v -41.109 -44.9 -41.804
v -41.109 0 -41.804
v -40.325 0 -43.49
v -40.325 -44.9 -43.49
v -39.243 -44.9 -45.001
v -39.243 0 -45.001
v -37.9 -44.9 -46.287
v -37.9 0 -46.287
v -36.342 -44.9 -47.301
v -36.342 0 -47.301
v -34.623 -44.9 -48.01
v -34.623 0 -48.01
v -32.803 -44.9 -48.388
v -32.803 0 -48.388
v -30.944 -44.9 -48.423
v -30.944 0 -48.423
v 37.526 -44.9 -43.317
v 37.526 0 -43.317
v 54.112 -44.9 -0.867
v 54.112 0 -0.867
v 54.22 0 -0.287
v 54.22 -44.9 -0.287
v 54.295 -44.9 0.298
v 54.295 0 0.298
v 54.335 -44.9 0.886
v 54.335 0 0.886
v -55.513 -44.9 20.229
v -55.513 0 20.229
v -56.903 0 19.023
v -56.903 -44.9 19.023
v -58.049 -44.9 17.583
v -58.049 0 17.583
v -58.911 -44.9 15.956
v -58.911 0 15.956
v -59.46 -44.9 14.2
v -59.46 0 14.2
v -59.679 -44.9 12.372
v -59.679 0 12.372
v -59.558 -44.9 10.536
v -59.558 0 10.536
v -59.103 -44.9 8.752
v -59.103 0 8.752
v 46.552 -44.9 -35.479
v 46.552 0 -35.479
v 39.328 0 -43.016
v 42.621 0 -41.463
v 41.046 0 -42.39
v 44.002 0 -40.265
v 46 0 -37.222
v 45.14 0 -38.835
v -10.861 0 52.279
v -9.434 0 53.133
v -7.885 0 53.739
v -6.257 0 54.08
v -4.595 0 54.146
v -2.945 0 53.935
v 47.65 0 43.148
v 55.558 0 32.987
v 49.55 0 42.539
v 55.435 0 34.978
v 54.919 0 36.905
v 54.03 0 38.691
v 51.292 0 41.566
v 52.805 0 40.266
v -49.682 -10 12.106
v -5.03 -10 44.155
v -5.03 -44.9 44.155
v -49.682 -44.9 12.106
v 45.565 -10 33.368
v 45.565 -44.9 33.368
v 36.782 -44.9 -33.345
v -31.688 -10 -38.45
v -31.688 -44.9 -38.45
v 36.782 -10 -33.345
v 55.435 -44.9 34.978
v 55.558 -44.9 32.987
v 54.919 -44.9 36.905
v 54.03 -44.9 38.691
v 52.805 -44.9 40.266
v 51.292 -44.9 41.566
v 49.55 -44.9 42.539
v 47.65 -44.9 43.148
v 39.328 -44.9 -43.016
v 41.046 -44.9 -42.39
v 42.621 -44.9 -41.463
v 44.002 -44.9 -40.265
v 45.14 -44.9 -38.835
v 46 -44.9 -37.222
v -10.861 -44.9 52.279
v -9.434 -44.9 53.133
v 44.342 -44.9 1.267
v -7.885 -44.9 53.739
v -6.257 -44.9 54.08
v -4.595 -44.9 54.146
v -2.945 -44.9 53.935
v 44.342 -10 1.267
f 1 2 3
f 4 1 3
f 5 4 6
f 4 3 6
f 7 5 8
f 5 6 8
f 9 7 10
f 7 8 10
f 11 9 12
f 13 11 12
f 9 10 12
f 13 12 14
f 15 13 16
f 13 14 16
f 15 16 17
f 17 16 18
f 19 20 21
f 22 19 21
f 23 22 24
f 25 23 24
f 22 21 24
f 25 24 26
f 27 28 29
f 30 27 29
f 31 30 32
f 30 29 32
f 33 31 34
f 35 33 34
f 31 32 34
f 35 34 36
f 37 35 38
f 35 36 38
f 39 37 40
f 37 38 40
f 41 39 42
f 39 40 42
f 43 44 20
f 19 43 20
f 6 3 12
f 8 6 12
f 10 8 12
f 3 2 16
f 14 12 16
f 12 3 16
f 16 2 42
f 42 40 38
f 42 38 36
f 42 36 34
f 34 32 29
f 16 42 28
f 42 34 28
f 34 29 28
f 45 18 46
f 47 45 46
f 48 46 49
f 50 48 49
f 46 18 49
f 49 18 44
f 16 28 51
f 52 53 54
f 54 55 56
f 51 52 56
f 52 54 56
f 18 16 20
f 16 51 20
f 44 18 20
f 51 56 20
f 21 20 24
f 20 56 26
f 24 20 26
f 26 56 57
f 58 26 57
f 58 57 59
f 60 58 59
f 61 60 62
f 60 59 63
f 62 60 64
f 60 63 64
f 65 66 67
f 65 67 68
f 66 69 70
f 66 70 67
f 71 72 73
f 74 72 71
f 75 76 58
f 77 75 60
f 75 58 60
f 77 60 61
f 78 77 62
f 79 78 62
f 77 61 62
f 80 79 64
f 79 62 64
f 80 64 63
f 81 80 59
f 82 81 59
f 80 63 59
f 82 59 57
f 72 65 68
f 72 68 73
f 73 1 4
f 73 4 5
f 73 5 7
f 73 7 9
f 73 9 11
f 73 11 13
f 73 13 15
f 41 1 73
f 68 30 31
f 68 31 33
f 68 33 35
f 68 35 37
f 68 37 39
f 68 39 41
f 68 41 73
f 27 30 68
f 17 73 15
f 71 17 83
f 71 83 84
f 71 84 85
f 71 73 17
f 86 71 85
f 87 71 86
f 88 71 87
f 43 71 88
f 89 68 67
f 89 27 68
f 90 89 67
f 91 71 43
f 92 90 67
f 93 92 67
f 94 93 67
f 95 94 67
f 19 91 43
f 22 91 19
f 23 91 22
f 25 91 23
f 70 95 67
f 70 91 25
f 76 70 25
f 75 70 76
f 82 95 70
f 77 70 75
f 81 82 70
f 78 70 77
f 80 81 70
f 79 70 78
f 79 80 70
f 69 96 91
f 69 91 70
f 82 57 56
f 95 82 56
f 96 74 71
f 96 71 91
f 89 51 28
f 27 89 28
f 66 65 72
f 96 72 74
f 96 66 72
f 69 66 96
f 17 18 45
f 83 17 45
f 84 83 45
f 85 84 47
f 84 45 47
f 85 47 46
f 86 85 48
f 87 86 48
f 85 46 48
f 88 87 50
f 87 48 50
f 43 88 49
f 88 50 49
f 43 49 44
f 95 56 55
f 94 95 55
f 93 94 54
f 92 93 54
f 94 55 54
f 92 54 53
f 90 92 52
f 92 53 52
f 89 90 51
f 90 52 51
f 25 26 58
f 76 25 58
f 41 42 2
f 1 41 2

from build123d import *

# Parameters (mm, degrees)
F1_DEPTH = 44.9
F2_T     = 10


# Not quite as in the source:
# - a shell that OpenCascade refuses in one call is made with other operations: the cavity is built on its own and cut out


with BuildPart() as f1:
    # F0 (on Front) → F1 (new body)
    with BuildSketch(Plane.XZ):
        with BuildLine():
            Line((-10.8614214341, 52.2791932931), (-55.5132357346, 20.2294568531))
            ThreePointArc((-55.5132357346, 20.2294568531), (-59.2261437786, 15.0907818347), (-59.1031517936, 8.7522851628))
            Line((-59.1031517936, 8.7522851628), (-41.1086877204, -41.8035860786))
            ThreePointArc((-41.1086877204, -41.8035860786), (-37.1445537144, -46.8302155121), (-30.9441109574, -48.4226575039))
            Line((-30.9441109574, -48.4226575039), (37.5255827113, -43.3174577507))
            ThreePointArc((37.5255827113, -43.3174577507), (43.3388920745, -40.8954764028), (46.5517141249, -35.4789891764))
            Line((46.5517141249, -35.4789891764), (54.1115878941, -0.8666353692))
            ThreePointArc((54.1115878941, -0.8666353692), (54.2619213312, 0.0049565354), (54.334653207, 0.886422737))
            Line((54.334653207, 0.886422737), (55.5578979933, 32.9868546181))
            ThreePointArc((55.5578979933, 32.9868546181), (53.4569722953, 39.5092382704), (47.6504120091, 43.1478142196))
            Line((47.6504120091, 43.1478142196), (-2.9450499877, 53.9354364594))
            ThreePointArc((-2.9450499877, 53.9354364594), (-7.0781470335, 53.9433412691), (-10.8614214341, 52.2791932931))
        make_face()
    extrude(amount=F1_DEPTH)

    # F2: shell of thickness 10, made by hand


with BuildPart() as f2_core1:
    # F2_t2: copy of F1
    add(f1.part)

    # the walls: a layer under each face that stays
    f2_faces = [f2_core1.faces().sort_by_distance(p)[0] for p in [
        (54.9462756001, -22.45, 16.9366386775),
        (22.3526810107, -22.45, 48.5416253395),
        (-33.1873285843, -22.45, 36.2543250731),
        (-50.105919757, -22.45, -16.5256504579),
        (3.2907358769, -22.45, -45.8700576273),
        (50.3316510095, -22.45, -18.1728122728),
        (-2.0584874118, 0, 2.8524646536),
    ]]
    thicken(f2_faces, amount=-F2_T, mode=Mode.SUBTRACT)


with BuildPart() as f1_1:
    add(f1.part)

    # what is left inside the walls is the cavity
    f2_cavity = [f2_core1.part.solids().sort_by_distance(p)[0] for p in [
        (-2.058487, -10.1, -10.915137),
    ]]
    add(f2_cavity, mode=Mode.SUBTRACT)


solid = f1_1.part
